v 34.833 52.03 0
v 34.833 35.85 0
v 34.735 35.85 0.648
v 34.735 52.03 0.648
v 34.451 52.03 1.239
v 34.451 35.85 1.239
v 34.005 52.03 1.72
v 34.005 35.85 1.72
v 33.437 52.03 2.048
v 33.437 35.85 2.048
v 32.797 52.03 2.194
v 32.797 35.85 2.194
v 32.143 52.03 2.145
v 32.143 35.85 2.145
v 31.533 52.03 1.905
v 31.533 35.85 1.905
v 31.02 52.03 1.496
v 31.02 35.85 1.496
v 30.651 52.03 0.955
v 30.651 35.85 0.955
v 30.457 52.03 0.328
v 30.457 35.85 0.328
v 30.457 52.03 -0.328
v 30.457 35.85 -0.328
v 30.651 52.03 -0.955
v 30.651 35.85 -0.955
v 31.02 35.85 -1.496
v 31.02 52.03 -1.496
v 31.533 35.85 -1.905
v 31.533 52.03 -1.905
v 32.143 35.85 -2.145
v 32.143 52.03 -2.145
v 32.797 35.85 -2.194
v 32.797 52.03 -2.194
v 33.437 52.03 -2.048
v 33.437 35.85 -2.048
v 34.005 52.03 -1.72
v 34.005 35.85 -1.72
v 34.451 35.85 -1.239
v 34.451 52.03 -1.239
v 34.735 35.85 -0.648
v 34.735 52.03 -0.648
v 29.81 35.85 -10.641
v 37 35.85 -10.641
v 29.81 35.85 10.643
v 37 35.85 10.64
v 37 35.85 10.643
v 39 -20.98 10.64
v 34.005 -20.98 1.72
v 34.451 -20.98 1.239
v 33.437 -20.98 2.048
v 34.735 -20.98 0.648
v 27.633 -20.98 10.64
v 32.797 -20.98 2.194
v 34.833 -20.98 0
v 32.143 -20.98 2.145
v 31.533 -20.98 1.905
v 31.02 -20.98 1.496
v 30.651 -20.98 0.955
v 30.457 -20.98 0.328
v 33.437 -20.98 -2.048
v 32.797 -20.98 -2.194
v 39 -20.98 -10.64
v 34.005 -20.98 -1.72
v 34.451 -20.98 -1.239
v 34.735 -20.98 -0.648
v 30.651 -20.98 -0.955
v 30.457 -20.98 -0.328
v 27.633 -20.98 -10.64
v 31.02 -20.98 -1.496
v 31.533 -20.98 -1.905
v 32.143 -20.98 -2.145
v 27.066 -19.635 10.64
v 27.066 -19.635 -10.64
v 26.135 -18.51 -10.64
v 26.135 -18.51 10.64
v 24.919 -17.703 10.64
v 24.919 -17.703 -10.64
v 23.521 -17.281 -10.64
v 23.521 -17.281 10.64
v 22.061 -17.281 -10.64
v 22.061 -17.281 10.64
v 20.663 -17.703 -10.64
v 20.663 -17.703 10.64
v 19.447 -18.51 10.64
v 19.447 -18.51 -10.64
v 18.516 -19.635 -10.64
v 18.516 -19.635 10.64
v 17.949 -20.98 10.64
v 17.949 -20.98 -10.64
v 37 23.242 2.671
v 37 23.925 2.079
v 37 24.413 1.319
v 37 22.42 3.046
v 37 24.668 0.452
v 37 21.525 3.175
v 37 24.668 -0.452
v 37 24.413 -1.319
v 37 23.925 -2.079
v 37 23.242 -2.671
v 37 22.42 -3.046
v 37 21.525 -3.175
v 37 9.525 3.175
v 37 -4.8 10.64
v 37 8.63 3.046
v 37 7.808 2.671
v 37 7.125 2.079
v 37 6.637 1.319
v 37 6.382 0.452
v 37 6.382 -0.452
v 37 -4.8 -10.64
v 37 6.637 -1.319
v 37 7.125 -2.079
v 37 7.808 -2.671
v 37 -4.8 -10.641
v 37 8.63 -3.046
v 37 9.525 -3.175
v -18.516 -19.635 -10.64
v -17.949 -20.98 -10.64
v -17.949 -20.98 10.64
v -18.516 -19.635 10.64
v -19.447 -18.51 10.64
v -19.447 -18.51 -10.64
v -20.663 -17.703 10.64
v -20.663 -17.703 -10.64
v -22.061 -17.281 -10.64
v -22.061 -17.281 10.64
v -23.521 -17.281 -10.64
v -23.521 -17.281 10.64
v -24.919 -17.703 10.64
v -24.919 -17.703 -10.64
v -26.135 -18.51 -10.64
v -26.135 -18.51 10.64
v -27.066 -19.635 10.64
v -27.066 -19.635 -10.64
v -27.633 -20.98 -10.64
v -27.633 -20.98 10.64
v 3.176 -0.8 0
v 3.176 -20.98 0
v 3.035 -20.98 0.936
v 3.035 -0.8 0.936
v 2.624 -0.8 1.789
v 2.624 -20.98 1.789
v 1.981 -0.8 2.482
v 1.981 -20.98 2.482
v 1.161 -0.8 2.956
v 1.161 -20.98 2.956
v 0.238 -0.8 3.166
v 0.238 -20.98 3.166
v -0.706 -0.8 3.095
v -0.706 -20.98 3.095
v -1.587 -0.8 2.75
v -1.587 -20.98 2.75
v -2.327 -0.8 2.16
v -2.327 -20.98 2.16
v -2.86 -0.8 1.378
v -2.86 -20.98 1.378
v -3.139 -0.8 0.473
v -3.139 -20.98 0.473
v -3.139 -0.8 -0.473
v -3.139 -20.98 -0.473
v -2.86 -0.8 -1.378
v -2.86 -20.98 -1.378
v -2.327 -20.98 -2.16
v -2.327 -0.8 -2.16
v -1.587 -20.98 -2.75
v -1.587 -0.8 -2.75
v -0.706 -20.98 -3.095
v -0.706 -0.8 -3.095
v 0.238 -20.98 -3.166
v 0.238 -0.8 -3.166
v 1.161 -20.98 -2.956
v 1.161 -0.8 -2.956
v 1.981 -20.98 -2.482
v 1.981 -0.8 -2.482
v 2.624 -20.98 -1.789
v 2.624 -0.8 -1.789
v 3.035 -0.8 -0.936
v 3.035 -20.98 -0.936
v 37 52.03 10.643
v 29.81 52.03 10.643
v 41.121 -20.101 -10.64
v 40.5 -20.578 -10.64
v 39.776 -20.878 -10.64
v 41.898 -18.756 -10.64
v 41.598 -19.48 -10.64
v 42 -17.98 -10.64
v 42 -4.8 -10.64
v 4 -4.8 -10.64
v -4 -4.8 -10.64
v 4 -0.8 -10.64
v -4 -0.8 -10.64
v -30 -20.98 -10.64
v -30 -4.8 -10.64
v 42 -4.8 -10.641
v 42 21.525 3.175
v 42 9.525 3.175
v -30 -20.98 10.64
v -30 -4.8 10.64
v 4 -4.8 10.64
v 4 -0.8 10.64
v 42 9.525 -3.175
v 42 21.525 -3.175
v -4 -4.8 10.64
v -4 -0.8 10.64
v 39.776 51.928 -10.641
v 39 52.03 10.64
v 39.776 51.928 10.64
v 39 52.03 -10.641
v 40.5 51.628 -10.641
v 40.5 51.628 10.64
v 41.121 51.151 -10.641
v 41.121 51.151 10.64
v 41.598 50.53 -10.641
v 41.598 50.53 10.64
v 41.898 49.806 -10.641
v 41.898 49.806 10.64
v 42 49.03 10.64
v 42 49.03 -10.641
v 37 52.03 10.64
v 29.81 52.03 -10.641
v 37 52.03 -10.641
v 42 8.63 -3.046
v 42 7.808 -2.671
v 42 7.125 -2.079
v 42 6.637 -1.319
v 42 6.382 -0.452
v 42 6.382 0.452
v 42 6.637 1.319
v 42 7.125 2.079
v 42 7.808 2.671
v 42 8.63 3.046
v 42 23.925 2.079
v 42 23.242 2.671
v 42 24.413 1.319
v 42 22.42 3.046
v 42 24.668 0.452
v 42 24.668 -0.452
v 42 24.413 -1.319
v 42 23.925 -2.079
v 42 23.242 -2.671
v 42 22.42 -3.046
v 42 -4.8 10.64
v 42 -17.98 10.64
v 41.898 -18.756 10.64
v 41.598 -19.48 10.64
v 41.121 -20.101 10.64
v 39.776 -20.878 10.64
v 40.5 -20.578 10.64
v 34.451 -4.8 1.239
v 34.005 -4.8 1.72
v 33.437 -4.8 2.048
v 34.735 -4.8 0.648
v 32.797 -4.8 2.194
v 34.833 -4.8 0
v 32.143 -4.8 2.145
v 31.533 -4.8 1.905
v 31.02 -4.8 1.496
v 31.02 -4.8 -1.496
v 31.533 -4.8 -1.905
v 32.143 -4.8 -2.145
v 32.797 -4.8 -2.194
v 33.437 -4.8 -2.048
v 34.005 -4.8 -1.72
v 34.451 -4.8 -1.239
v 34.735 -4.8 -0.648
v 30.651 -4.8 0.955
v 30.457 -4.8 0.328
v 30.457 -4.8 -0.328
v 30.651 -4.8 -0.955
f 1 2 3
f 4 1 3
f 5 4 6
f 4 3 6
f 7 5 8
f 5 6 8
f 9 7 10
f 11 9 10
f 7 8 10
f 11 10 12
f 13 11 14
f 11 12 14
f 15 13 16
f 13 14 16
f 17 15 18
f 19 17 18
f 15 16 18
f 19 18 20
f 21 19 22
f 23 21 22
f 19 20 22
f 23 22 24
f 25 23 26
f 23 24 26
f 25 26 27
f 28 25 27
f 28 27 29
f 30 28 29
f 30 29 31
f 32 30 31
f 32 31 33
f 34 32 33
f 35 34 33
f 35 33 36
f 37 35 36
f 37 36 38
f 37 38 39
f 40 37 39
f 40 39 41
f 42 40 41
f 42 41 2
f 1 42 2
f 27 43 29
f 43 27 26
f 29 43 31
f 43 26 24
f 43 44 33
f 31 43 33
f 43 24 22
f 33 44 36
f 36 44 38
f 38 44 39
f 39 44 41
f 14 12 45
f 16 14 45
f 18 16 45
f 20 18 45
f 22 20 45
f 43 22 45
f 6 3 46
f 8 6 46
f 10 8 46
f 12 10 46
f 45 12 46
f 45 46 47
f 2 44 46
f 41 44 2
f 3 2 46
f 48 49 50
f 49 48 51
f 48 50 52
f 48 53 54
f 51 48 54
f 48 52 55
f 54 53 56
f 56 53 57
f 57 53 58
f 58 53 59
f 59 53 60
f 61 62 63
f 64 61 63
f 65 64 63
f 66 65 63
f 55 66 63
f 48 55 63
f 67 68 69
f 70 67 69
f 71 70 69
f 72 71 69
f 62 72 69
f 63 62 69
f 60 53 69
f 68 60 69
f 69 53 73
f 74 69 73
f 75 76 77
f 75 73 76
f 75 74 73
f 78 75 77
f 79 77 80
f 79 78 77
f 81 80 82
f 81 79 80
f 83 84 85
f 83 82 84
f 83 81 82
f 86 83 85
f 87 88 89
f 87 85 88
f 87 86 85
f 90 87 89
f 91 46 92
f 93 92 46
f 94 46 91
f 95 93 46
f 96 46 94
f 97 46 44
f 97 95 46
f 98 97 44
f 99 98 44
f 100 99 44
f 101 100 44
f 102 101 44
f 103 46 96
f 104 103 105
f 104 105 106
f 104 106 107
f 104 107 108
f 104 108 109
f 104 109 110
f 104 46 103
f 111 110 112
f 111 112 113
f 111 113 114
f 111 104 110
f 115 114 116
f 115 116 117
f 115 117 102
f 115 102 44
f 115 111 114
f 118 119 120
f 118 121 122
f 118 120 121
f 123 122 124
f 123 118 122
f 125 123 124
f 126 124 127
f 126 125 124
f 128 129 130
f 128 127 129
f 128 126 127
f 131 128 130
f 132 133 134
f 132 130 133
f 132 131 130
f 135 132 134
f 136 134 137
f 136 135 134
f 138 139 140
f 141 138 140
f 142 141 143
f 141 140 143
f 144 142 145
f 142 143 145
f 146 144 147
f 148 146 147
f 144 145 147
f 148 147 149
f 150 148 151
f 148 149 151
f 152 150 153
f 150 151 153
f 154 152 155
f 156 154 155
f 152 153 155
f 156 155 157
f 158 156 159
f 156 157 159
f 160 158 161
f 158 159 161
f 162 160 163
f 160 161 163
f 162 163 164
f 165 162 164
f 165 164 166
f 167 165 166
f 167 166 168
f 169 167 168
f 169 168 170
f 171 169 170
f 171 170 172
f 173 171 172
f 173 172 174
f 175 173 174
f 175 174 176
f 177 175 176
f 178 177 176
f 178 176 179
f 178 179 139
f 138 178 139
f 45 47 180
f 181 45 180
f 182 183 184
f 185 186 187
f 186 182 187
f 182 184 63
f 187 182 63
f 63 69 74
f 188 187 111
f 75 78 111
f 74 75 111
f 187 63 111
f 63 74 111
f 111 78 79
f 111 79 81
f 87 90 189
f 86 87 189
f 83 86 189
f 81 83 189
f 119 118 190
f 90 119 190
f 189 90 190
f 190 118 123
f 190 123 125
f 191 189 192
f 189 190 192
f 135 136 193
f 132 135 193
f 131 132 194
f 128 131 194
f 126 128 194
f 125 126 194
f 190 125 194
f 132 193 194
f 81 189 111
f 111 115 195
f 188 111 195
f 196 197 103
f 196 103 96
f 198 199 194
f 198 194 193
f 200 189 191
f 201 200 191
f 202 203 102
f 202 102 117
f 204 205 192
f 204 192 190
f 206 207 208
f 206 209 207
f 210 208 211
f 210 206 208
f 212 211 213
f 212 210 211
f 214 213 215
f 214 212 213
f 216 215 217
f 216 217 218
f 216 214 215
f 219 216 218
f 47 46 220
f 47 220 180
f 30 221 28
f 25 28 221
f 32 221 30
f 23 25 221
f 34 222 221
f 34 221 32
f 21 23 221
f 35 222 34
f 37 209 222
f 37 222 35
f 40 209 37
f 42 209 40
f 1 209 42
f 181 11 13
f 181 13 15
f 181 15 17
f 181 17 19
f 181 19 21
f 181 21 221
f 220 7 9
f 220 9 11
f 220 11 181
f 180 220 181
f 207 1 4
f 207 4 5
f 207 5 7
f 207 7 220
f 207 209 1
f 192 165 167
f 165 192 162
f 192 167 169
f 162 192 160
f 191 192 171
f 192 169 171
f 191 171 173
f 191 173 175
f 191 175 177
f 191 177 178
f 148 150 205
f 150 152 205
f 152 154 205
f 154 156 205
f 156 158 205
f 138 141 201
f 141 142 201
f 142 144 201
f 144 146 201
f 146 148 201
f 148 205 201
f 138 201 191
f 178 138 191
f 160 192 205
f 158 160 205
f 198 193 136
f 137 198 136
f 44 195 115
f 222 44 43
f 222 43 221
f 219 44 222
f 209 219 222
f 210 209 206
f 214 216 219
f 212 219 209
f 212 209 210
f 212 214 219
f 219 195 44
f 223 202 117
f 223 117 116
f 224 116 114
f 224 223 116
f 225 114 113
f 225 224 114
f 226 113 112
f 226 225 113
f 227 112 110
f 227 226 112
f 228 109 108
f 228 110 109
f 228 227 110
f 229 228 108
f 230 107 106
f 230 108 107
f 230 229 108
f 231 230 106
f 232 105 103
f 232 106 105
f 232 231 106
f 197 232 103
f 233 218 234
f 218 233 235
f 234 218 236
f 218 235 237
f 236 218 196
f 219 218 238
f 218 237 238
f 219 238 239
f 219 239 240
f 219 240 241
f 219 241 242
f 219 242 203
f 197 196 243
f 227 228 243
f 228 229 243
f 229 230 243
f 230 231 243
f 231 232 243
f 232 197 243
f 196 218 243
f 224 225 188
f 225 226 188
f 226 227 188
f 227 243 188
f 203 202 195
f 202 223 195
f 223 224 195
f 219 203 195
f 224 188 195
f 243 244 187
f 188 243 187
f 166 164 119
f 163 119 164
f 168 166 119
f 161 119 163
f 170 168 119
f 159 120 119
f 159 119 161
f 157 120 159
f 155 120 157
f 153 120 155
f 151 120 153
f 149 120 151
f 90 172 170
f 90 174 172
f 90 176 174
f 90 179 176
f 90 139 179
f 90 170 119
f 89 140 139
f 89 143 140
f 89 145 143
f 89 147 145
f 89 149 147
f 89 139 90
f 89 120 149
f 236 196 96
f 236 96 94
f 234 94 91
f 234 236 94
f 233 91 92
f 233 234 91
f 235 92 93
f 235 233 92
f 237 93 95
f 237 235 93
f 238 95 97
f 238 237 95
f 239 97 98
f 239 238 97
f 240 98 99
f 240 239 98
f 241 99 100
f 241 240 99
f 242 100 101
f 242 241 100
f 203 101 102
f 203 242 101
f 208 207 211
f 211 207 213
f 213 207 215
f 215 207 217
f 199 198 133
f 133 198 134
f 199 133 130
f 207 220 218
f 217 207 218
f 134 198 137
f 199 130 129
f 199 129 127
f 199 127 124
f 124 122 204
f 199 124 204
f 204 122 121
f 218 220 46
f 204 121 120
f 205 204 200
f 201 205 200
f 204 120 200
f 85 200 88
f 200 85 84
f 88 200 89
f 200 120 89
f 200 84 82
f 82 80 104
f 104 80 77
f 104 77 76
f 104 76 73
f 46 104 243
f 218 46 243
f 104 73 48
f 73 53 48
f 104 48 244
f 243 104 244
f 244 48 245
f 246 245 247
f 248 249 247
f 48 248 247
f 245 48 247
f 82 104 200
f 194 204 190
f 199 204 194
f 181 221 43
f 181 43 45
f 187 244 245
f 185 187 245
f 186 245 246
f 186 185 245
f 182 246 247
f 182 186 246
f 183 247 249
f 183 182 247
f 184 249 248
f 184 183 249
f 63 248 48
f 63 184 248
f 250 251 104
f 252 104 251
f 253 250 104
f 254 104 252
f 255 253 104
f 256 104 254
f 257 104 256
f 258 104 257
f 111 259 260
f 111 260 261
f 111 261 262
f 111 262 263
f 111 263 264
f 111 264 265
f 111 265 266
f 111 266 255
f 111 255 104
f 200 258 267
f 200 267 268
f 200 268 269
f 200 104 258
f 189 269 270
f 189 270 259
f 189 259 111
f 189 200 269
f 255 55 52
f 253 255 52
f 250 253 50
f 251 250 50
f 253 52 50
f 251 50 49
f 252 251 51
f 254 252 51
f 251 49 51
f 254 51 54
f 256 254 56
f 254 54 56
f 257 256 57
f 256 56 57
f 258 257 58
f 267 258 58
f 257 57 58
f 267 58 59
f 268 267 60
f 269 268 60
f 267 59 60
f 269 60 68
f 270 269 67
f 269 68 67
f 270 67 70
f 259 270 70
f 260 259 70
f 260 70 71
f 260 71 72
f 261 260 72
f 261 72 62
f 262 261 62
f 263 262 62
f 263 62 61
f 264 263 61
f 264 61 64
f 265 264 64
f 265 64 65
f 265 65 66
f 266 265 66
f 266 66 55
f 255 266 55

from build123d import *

# Parameters (mm, degrees)
BOSS_EXTRUDE1_DEPTH     = 10.8
BOSS_EXTRUDE2_DEPTH     = 10.64
CUT_EXTRUDE1_DEPTH      = 39.168054705
CUT_EXTRUDE1_DEPTH_BACK = 39.168054705
SKETCH5_R               = 5
FILLET1_R               = 1
SKETCH6_W               = 21.28
SKETCH6_H               = 16.18
BOSS_EXTRUDE3_DEPTH     = 12
SKETCH7_W               = 5
SKETCH7_H               = 21.281328743
BOSS_EXTRUDE4_DEPTH     = 56.83
SKETCH8_W               = 21.284331222
SKETCH8_H               = 16.18
BOSS_EXTRUDE5_DEPTH     = 7.19
FILLET3_R               = 3
SKETCH9_R               = 2.2
CUT_EXTRUDE2_DEPTH      = 85.918196519
SKETCH10_R              = 3.175
CUT_EXTRUDE3_DEPTH      = 85.918196519
SKETCH11_W              = 24.977296572
SKETCH11_H              = 9.721484234
CUT_EXTRUDE4_DEPTH      = 71.220021919
CUT_EXTRUDE6_DEPTH      = 90.46728118


with BuildPart() as part:
    # Sketch2 → Boss-Extrude1 (new body)
    with BuildSketch(Plane.XY):
        Polygon((-10.1, 0), (0, 0), (0, 7), (-6.25480432, 7), (-10.1, 1.709943763), align=None)
        Polygon((0, 0), (10.1, 0), (10.1, 1.709943763), (6.25480432, 7), (0, 7), align=None)
    extrude(amount=BOSS_EXTRUDE1_DEPTH)

    # Sketch4 → Boss-Extrude2 (add, symmetric)
    with BuildSketch(Plane.XY):
        Polygon((-4, 0), (-4, -4.8), (-30, -4.8), (-30, -20.98), (30, -20.98), (30, -4.8), (4, -4.8), (4, 0), align=None)
    extrude(amount=BOSS_EXTRUDE2_DEPTH, both=True)

    # Sketch5 → Cut-Extrude1 (cut, two sides: drawn at the far end of the back side and taken through both)
    with BuildSketch(Plane.XY.offset(-CUT_EXTRUDE1_DEPTH_BACK)):
        with Locations((-22.790976064, -22.227391232)):
            Circle(SKETCH5_R)
        with Locations((22.790976064, -22.227391232)):
            Circle(SKETCH5_R)
    extrude(amount=CUT_EXTRUDE1_DEPTH + CUT_EXTRUDE1_DEPTH_BACK, mode=Mode.SUBTRACT)

    # Fillet1
    fillet1_edges = [part.edges().sort_by_distance(p)[0] for p in [
        (-10.1, 0, 5.4),
        (-10.1, 1.709943763, 5.4),
        (-6.25480432, 7, 5.4),
        (6.25480432, 7, 5.4),
        (10.1, 1.709943763, 5.4),
        (10.1, 0, 5.4),
    ]]
    fillet(fillet1_edges, radius=FILLET1_R)

    # Sketch6 → Boss-Extrude3 (add)
    with BuildSketch(Plane(origin=(30, 0, 0), x_dir=(0, 0, -1), z_dir=(1, 0, 0))):
        with Locations((0, -12.89)):
            Rectangle(SKETCH6_W, SKETCH6_H)
    extrude(amount=BOSS_EXTRUDE3_DEPTH)

    # Sketch7 → Boss-Extrude4 (add)
    with BuildSketch(Plane(origin=(0, -4.8, 0), x_dir=(1, 0, 0), z_dir=(0, 1, 0))):
        with Locations((39.5, 0.000664372)):
            Rectangle(SKETCH7_W, SKETCH7_H)
    extrude(amount=BOSS_EXTRUDE4_DEPTH)

    # Sketch8 → Boss-Extrude5 (add)
    with BuildSketch(Plane.ZY.offset(-37)):
        with Locations((0.000836868, 43.94)):
            Rectangle(SKETCH8_W, SKETCH8_H)
    extrude(amount=BOSS_EXTRUDE5_DEPTH)

    # Fillet3
    fillet3_edges = [part.edges().sort_by_distance(p)[0] for p in [
        (42, -20.98, 0),
        (42, 52.03, -0.000664372),
    ]]
    fillet(fillet3_edges, radius=FILLET3_R)

    # Sketch9 → Cut-Extrude2 (cut, through all)
    with BuildSketch(Plane.XZ.offset(20.98)):
        with Locations((32.632878078, 0)):
            Circle(SKETCH9_R)
    extrude(amount=-CUT_EXTRUDE2_DEPTH, mode=Mode.SUBTRACT)

    # Sketch10 → Cut-Extrude3 (cut, through all)
    with BuildSketch(Plane.XZ.offset(20.98)):
        with Locations((0.000925951, 0)):
            Circle(SKETCH10_R)
    extrude(amount=-CUT_EXTRUDE3_DEPTH, mode=Mode.SUBTRACT)

    # Sketch11 → Cut-Extrude4 (cut, through all)
    with BuildSketch(Plane.XY.offset(10.8)):
        with Locations((-0.121132817, 4.060742117)):
            Rectangle(SKETCH11_W, SKETCH11_H)
    extrude(amount=-CUT_EXTRUDE4_DEPTH, mode=Mode.SUBTRACT)

    # Sketch13 → Cut-Extrude6 (cut, through all)
    with BuildSketch(Plane(origin=(42, 0, 0), x_dir=(0, 0, -1), z_dir=(1, 0, 0))):
        with BuildLine():
            Line((3.175, 21.525), (3.175, 9.525))
            ThreePointArc((3.175, 9.525), (0, 6.35), (-3.175, 9.525))
            Line((-3.175, 9.525), (-3.175, 21.525))
            ThreePointArc((-3.175, 21.525), (0, 24.7), (3.175, 21.525))
        make_face()
    extrude(amount=-CUT_EXTRUDE6_DEPTH, mode=Mode.SUBTRACT)


solid = part.part
